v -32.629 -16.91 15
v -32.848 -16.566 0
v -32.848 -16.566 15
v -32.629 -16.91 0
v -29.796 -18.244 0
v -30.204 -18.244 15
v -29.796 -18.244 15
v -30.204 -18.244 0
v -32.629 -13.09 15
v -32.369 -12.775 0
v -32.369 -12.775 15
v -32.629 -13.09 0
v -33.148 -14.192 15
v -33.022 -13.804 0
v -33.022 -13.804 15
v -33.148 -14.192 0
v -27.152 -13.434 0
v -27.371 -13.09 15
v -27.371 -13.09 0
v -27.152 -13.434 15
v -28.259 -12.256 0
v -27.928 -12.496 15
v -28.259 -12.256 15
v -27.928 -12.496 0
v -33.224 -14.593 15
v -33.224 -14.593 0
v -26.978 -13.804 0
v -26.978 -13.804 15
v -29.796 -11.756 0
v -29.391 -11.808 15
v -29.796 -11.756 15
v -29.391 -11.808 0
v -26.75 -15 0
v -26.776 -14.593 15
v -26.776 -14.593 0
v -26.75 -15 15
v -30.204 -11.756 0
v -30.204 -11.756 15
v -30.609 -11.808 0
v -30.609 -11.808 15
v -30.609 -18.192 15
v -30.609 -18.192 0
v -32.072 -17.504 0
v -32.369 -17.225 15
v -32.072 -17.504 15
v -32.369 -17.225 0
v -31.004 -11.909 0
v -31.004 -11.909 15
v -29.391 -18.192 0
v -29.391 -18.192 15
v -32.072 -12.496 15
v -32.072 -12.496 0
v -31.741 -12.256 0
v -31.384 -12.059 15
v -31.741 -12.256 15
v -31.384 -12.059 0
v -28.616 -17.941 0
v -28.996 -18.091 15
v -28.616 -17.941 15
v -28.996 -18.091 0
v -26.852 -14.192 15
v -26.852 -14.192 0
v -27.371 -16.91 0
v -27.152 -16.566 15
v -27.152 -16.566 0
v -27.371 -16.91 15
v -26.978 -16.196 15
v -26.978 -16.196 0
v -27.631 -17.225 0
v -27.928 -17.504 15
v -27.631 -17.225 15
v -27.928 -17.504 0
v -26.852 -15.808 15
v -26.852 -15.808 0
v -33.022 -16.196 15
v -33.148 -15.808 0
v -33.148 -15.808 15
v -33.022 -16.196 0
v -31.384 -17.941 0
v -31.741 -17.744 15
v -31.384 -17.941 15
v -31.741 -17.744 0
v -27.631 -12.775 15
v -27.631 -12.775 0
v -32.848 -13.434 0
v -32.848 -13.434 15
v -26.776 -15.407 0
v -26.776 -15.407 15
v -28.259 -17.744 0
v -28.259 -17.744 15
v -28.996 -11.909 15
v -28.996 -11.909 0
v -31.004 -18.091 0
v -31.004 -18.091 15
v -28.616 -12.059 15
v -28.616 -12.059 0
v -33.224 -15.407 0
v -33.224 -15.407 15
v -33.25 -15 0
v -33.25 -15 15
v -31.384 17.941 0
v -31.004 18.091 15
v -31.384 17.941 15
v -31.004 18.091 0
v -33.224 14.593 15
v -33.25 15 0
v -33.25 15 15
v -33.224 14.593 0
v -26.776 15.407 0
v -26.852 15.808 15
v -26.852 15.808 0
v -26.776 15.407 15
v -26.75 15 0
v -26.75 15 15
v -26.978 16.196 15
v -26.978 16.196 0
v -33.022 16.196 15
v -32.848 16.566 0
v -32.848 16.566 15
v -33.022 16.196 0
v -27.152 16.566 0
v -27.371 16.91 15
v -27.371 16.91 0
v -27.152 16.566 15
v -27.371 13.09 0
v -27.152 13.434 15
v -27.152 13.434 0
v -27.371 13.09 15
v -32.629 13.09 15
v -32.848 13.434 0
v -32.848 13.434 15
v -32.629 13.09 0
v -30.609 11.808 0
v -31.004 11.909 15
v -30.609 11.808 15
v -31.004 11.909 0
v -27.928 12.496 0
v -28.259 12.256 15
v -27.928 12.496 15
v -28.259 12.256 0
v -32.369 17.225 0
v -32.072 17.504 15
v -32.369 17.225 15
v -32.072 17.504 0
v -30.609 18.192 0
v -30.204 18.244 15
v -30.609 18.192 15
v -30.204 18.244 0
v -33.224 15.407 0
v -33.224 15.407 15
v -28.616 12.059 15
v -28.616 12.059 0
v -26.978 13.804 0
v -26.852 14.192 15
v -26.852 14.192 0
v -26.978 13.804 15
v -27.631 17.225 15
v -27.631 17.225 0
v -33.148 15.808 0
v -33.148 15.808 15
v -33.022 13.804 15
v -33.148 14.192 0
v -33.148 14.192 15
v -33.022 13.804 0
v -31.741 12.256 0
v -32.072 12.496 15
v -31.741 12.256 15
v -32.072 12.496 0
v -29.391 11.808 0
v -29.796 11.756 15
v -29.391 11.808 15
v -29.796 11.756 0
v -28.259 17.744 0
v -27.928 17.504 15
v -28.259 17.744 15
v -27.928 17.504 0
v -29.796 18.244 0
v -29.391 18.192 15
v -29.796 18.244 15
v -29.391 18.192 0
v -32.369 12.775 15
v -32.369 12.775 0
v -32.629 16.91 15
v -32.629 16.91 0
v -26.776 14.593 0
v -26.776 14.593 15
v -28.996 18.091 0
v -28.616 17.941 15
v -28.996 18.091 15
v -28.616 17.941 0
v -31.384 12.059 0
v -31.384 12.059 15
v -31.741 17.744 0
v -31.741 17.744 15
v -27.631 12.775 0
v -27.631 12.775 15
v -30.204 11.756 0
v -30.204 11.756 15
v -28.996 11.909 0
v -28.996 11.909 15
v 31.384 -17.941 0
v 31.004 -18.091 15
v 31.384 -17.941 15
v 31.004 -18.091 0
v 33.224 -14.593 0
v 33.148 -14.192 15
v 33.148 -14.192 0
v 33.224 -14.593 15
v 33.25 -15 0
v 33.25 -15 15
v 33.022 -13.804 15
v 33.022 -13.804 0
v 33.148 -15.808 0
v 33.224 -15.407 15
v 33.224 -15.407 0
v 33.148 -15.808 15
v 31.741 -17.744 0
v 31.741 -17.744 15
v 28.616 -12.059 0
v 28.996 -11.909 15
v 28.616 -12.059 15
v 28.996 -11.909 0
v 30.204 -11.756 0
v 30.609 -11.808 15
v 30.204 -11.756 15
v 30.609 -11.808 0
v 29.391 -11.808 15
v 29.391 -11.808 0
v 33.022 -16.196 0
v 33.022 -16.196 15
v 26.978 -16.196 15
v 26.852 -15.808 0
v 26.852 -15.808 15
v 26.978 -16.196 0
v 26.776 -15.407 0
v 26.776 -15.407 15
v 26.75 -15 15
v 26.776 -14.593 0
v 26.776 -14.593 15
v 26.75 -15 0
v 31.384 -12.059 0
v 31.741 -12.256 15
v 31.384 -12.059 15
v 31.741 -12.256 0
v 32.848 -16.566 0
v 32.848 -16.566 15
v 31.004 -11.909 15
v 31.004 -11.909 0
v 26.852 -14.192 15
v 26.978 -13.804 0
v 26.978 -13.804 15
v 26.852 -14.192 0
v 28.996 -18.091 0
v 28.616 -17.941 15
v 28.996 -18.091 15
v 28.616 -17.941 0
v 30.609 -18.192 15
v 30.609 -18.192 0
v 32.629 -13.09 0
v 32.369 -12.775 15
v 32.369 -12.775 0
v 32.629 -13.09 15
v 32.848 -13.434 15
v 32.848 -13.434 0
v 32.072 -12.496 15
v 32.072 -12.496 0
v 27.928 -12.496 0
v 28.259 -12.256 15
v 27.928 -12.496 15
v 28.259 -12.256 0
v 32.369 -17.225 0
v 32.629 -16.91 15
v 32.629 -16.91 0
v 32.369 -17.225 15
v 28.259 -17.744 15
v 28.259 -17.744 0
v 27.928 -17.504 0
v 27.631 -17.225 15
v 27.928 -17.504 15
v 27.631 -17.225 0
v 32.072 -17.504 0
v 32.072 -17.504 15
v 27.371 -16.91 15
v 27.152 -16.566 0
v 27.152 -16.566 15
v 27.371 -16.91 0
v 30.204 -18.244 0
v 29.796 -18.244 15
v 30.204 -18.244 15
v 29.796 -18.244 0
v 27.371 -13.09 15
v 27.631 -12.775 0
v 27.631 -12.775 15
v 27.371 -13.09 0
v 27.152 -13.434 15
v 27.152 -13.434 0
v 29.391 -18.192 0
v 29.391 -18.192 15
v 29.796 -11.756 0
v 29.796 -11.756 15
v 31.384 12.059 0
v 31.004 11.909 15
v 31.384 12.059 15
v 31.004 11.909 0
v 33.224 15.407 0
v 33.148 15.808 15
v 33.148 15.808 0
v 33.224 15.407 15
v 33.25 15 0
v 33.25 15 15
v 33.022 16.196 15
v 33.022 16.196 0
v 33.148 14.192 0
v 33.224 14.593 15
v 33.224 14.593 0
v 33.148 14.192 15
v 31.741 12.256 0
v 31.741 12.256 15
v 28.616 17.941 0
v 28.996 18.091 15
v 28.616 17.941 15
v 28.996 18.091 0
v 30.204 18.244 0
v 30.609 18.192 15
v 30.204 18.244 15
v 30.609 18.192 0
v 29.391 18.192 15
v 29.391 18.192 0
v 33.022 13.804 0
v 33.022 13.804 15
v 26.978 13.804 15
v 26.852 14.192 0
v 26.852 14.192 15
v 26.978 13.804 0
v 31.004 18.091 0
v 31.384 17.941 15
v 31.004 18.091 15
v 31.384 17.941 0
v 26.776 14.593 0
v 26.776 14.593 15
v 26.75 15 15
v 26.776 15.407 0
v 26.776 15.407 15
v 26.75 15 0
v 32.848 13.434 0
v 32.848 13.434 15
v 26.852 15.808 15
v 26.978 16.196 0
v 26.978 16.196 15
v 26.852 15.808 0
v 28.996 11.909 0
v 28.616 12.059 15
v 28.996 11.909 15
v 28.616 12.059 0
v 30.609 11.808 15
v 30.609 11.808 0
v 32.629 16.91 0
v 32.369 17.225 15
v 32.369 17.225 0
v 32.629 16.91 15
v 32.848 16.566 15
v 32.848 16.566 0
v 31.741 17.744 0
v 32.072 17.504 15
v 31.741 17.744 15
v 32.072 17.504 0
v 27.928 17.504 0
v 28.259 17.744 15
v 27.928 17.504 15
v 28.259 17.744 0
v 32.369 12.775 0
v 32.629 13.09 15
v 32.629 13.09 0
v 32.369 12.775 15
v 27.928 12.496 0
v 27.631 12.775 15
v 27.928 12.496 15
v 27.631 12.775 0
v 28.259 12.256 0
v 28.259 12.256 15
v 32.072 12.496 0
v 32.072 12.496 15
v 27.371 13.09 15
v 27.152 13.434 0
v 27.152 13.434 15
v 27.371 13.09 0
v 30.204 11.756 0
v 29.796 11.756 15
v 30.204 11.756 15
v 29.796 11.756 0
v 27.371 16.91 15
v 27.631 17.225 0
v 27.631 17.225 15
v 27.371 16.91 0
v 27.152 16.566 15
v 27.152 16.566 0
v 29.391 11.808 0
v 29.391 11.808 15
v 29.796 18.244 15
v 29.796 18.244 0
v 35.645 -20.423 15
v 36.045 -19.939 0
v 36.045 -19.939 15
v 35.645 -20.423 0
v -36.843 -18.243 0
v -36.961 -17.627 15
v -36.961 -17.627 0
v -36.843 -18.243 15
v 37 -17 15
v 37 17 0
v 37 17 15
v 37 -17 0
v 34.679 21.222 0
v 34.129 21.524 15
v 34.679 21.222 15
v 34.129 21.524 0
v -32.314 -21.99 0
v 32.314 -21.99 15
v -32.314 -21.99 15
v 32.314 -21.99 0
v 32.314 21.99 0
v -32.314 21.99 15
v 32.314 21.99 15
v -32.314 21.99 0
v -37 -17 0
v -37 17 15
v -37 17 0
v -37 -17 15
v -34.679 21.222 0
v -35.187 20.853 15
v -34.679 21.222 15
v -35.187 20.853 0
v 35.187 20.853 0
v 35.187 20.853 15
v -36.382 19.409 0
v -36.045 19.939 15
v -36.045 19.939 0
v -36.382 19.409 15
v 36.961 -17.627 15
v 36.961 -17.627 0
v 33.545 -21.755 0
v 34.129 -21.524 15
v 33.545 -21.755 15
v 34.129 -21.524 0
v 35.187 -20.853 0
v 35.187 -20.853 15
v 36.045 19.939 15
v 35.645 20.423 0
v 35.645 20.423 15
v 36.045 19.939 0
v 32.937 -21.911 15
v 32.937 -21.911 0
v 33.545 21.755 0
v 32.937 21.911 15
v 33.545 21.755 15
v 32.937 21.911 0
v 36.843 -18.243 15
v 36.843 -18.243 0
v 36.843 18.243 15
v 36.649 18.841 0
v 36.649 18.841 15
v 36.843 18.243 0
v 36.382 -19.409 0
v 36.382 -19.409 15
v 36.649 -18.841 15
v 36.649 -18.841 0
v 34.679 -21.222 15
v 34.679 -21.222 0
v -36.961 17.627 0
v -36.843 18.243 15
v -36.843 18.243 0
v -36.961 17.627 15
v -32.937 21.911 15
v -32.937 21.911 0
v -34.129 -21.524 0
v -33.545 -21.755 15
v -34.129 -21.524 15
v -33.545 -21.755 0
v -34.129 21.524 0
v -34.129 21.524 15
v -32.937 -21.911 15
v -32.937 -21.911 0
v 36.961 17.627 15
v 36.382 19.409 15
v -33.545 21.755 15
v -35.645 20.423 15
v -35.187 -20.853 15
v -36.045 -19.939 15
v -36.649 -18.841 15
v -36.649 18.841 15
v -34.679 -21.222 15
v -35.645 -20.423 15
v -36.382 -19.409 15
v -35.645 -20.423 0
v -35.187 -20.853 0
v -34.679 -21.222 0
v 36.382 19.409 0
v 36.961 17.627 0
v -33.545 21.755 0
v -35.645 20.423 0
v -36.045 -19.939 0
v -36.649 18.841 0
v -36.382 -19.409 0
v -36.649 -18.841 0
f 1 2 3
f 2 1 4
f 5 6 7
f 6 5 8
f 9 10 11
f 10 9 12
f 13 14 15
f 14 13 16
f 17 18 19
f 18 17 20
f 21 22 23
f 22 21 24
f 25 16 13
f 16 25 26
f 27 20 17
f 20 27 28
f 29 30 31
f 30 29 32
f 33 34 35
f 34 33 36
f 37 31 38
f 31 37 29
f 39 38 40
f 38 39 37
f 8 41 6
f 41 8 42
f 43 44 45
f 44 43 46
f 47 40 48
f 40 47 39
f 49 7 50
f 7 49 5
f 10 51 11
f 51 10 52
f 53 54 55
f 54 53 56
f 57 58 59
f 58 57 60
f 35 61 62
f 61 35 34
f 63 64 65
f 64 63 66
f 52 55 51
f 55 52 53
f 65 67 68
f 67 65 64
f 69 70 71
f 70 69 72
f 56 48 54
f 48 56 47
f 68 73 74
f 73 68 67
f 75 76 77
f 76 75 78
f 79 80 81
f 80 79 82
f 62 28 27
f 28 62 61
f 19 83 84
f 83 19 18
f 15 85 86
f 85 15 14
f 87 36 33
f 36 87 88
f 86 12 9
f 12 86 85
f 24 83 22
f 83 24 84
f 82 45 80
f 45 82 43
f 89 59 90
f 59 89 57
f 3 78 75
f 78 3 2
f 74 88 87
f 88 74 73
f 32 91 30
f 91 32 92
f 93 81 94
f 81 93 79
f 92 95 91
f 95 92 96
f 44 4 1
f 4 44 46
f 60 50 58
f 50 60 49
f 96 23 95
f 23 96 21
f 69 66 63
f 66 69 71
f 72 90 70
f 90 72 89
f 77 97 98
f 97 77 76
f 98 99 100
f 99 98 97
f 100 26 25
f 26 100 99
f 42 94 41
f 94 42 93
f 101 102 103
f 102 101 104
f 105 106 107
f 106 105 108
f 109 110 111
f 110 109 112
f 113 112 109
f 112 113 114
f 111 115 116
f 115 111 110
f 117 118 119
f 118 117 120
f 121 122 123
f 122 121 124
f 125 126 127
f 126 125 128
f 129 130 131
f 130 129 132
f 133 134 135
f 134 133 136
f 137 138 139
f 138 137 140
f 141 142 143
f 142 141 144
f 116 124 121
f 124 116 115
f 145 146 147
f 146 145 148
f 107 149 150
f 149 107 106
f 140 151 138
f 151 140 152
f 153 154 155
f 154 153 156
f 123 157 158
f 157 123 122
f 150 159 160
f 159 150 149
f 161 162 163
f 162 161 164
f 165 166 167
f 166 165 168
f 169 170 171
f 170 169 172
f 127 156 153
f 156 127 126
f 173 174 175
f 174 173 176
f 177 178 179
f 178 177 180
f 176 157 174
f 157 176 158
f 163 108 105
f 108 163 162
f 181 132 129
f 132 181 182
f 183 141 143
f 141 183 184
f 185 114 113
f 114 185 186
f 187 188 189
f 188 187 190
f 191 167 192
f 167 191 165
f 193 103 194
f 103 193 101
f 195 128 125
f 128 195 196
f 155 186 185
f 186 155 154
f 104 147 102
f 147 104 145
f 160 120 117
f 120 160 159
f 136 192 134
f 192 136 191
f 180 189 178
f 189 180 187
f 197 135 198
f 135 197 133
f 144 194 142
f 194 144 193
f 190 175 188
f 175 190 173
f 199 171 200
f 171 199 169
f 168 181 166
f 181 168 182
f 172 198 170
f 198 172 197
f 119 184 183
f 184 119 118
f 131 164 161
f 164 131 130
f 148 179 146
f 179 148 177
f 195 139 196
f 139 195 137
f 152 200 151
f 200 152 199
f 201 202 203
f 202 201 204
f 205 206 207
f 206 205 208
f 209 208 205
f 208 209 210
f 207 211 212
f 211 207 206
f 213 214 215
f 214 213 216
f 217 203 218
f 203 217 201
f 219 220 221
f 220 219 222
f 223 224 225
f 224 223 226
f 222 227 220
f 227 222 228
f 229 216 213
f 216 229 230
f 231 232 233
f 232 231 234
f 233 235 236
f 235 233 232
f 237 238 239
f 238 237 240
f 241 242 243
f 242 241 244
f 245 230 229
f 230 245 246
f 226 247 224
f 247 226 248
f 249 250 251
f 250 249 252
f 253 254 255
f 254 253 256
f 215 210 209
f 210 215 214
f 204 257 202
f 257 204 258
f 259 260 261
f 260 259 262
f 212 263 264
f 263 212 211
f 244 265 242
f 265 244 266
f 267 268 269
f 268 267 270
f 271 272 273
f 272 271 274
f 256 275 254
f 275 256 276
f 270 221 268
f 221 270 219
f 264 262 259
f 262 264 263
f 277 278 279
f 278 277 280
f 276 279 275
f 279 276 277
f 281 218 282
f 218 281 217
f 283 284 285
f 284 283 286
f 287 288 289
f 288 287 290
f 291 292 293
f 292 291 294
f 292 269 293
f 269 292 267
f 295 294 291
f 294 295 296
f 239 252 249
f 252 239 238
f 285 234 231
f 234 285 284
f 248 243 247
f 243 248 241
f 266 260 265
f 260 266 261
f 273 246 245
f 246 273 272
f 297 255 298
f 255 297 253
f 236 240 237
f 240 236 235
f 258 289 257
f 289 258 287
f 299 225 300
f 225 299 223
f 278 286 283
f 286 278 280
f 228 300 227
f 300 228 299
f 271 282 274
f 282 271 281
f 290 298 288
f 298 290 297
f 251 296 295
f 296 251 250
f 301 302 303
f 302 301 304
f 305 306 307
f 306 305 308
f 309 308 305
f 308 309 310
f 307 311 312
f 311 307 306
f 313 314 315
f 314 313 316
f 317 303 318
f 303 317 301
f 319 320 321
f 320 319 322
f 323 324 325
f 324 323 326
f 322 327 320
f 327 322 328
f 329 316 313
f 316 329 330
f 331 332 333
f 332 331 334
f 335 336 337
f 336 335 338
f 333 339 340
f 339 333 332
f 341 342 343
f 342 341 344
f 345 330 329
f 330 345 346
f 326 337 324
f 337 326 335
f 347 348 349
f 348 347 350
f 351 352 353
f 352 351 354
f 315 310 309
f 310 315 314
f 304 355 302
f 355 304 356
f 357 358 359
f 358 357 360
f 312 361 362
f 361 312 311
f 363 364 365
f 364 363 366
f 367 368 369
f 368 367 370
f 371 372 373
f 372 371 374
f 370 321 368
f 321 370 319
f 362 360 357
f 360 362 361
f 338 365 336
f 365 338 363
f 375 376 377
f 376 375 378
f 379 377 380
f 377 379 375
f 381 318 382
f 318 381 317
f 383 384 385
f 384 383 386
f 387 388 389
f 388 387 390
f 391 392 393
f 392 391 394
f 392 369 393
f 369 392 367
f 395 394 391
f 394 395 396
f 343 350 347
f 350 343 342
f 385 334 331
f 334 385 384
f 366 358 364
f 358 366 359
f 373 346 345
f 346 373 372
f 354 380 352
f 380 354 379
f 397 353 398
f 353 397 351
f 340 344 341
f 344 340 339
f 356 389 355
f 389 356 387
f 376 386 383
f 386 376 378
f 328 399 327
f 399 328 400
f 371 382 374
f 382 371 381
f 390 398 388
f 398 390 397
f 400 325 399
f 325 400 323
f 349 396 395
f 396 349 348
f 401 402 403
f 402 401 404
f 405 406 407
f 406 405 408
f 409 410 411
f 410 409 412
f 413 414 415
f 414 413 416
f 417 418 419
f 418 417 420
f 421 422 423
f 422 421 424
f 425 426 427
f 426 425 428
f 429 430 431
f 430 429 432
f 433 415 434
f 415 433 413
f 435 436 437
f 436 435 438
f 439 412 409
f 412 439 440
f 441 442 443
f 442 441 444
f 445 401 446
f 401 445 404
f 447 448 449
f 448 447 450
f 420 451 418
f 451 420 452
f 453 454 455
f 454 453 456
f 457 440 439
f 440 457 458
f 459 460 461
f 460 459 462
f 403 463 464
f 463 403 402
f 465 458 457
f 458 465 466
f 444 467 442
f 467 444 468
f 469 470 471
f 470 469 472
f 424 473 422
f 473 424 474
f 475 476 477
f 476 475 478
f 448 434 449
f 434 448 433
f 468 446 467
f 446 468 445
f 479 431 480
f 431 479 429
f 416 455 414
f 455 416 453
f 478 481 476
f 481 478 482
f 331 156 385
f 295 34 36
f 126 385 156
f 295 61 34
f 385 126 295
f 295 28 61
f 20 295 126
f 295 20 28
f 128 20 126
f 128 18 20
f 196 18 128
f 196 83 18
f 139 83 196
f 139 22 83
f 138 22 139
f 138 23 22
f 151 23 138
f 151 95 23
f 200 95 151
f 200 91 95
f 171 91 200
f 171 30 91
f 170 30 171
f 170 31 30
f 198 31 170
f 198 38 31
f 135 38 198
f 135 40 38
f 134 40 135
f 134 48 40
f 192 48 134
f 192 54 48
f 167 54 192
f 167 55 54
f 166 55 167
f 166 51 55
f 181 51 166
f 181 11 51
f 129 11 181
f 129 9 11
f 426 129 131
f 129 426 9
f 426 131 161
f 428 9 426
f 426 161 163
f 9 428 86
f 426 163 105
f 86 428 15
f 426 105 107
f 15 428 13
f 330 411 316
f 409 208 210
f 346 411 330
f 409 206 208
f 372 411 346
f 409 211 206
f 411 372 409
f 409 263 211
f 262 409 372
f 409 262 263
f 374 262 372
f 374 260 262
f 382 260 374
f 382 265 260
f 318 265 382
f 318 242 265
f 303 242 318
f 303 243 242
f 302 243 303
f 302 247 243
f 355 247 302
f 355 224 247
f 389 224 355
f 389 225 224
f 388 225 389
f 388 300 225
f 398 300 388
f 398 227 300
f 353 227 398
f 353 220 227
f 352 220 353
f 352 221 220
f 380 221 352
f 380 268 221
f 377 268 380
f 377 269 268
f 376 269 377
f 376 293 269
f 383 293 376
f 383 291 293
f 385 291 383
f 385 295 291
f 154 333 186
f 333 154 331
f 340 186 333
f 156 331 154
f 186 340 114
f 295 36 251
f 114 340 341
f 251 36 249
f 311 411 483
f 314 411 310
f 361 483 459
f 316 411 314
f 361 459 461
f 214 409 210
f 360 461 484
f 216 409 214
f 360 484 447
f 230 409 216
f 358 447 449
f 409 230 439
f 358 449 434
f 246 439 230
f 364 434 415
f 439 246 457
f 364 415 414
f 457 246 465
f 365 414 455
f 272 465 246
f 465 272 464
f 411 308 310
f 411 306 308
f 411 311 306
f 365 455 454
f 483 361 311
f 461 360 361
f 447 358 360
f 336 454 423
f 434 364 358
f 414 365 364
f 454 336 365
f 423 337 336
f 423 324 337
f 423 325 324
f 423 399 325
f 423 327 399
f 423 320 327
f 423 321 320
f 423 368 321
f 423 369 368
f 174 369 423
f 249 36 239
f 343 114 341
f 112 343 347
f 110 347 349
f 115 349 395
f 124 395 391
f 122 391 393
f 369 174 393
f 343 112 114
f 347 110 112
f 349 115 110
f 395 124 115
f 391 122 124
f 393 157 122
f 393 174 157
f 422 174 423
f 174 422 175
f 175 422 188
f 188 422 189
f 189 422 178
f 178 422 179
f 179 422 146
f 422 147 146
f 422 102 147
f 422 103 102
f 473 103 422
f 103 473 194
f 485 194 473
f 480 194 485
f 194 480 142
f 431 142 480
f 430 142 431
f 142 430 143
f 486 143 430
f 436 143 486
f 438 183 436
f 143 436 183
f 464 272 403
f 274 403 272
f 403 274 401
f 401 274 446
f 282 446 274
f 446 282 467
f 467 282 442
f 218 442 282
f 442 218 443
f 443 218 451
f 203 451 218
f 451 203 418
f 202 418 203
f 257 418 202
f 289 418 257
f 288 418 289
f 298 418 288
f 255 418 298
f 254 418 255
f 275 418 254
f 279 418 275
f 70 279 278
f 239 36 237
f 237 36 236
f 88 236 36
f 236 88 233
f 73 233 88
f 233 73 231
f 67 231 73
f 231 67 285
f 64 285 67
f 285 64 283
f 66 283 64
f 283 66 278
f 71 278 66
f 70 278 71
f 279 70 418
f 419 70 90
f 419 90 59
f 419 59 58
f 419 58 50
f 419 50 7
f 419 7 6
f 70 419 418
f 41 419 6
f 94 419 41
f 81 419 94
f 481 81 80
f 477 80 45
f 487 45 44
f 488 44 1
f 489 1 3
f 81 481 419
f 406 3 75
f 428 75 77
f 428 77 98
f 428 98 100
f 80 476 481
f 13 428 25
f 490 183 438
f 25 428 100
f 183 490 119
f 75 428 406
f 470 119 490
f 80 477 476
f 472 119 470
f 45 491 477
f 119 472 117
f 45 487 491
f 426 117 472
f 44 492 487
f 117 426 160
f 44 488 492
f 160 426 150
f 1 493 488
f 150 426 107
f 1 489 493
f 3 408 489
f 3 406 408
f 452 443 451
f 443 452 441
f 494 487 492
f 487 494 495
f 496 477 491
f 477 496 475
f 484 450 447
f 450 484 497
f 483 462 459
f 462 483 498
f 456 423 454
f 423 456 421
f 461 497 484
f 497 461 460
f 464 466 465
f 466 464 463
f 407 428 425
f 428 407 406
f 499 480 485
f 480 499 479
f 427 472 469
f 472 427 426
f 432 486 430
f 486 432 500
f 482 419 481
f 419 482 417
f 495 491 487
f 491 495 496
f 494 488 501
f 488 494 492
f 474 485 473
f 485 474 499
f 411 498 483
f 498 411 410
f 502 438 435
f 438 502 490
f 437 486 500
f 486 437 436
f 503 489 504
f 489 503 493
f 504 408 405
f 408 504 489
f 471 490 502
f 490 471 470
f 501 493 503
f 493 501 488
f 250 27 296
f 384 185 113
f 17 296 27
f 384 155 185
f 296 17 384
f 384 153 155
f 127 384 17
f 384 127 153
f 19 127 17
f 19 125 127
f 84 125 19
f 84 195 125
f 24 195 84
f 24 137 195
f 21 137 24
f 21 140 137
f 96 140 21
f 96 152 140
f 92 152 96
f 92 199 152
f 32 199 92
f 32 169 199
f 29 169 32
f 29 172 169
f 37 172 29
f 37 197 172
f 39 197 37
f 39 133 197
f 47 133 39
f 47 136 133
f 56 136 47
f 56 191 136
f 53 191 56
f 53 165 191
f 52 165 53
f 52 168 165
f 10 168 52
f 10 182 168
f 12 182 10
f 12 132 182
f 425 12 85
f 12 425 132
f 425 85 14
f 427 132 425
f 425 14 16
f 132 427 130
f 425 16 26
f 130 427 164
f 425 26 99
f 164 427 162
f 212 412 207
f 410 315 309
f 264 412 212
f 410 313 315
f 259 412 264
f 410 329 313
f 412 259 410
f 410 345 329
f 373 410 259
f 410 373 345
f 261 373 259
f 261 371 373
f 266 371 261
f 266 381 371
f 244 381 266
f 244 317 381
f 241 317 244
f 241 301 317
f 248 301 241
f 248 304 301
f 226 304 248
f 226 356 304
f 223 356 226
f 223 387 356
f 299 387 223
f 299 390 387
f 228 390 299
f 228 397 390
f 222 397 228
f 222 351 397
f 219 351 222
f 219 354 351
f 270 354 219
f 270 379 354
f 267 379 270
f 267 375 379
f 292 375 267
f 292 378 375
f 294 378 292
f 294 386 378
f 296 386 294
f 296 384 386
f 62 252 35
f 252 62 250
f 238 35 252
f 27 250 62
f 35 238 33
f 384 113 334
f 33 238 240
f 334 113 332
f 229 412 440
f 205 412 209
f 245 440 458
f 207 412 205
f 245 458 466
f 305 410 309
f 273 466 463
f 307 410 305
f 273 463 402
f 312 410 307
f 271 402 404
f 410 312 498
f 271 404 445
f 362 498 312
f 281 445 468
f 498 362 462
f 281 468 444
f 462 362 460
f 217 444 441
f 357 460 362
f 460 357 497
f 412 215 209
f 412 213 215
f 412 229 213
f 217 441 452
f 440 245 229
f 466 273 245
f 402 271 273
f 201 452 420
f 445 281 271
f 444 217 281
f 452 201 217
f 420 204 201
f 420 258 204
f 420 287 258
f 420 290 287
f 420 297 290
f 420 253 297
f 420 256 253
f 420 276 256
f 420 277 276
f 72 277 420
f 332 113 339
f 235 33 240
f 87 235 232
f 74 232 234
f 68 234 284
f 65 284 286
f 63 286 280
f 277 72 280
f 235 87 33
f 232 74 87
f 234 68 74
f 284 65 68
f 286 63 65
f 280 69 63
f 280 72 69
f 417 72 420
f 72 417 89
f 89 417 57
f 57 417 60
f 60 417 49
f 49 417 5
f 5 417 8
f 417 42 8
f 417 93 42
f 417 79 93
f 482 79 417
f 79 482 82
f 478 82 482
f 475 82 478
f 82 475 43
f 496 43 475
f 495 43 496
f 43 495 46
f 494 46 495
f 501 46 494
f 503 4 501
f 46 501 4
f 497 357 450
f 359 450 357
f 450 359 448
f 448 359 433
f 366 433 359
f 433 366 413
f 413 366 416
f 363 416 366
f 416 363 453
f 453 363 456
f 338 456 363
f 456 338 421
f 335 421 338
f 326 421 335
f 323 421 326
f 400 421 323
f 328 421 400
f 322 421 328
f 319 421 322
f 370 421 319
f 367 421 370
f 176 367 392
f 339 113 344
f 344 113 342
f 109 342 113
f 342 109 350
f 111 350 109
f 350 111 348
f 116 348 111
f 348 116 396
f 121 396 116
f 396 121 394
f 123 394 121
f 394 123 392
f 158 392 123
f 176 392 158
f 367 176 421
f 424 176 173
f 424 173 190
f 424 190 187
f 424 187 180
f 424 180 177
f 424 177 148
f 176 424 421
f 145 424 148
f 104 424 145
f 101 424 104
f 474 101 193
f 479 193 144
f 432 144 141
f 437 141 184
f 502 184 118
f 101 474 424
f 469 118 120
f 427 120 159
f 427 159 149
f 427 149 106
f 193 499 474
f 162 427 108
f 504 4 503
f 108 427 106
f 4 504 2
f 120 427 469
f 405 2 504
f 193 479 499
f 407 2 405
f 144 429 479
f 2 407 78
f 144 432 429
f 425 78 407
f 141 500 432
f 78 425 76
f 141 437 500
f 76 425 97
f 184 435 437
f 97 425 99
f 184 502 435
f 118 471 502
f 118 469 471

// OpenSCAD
$fn = 50;


difference() {
	union() {
		hull() {
			translate(v = [-32.0000000000, 17.0000000000, 0]) {
				cylinder(h = 15, r = 5);
			}
			translate(v = [32.0000000000, 17.0000000000, 0]) {
				cylinder(h = 15, r = 5);
			}
			translate(v = [-32.0000000000, -17.0000000000, 0]) {
				cylinder(h = 15, r = 5);
			}
			translate(v = [32.0000000000, -17.0000000000, 0]) {
				cylinder(h = 15, r = 5);
			}
		}
	}
	union() {
		translate(v = [-30.0000000000, -15.0000000000, -100.0000000000]) {
			cylinder(h = 200, r = 3.2500000000);
		}
		translate(v = [-30.0000000000, 15.0000000000, -100.0000000000]) {
			cylinder(h = 200, r = 3.2500000000);
		}
		translate(v = [30.0000000000, -15.0000000000, -100.0000000000]) {
			cylinder(h = 200, r = 3.2500000000);
		}
		translate(v = [30.0000000000, 15.0000000000, -100.0000000000]) {
			cylinder(h = 200, r = 3.2500000000);
		}
	}
}
